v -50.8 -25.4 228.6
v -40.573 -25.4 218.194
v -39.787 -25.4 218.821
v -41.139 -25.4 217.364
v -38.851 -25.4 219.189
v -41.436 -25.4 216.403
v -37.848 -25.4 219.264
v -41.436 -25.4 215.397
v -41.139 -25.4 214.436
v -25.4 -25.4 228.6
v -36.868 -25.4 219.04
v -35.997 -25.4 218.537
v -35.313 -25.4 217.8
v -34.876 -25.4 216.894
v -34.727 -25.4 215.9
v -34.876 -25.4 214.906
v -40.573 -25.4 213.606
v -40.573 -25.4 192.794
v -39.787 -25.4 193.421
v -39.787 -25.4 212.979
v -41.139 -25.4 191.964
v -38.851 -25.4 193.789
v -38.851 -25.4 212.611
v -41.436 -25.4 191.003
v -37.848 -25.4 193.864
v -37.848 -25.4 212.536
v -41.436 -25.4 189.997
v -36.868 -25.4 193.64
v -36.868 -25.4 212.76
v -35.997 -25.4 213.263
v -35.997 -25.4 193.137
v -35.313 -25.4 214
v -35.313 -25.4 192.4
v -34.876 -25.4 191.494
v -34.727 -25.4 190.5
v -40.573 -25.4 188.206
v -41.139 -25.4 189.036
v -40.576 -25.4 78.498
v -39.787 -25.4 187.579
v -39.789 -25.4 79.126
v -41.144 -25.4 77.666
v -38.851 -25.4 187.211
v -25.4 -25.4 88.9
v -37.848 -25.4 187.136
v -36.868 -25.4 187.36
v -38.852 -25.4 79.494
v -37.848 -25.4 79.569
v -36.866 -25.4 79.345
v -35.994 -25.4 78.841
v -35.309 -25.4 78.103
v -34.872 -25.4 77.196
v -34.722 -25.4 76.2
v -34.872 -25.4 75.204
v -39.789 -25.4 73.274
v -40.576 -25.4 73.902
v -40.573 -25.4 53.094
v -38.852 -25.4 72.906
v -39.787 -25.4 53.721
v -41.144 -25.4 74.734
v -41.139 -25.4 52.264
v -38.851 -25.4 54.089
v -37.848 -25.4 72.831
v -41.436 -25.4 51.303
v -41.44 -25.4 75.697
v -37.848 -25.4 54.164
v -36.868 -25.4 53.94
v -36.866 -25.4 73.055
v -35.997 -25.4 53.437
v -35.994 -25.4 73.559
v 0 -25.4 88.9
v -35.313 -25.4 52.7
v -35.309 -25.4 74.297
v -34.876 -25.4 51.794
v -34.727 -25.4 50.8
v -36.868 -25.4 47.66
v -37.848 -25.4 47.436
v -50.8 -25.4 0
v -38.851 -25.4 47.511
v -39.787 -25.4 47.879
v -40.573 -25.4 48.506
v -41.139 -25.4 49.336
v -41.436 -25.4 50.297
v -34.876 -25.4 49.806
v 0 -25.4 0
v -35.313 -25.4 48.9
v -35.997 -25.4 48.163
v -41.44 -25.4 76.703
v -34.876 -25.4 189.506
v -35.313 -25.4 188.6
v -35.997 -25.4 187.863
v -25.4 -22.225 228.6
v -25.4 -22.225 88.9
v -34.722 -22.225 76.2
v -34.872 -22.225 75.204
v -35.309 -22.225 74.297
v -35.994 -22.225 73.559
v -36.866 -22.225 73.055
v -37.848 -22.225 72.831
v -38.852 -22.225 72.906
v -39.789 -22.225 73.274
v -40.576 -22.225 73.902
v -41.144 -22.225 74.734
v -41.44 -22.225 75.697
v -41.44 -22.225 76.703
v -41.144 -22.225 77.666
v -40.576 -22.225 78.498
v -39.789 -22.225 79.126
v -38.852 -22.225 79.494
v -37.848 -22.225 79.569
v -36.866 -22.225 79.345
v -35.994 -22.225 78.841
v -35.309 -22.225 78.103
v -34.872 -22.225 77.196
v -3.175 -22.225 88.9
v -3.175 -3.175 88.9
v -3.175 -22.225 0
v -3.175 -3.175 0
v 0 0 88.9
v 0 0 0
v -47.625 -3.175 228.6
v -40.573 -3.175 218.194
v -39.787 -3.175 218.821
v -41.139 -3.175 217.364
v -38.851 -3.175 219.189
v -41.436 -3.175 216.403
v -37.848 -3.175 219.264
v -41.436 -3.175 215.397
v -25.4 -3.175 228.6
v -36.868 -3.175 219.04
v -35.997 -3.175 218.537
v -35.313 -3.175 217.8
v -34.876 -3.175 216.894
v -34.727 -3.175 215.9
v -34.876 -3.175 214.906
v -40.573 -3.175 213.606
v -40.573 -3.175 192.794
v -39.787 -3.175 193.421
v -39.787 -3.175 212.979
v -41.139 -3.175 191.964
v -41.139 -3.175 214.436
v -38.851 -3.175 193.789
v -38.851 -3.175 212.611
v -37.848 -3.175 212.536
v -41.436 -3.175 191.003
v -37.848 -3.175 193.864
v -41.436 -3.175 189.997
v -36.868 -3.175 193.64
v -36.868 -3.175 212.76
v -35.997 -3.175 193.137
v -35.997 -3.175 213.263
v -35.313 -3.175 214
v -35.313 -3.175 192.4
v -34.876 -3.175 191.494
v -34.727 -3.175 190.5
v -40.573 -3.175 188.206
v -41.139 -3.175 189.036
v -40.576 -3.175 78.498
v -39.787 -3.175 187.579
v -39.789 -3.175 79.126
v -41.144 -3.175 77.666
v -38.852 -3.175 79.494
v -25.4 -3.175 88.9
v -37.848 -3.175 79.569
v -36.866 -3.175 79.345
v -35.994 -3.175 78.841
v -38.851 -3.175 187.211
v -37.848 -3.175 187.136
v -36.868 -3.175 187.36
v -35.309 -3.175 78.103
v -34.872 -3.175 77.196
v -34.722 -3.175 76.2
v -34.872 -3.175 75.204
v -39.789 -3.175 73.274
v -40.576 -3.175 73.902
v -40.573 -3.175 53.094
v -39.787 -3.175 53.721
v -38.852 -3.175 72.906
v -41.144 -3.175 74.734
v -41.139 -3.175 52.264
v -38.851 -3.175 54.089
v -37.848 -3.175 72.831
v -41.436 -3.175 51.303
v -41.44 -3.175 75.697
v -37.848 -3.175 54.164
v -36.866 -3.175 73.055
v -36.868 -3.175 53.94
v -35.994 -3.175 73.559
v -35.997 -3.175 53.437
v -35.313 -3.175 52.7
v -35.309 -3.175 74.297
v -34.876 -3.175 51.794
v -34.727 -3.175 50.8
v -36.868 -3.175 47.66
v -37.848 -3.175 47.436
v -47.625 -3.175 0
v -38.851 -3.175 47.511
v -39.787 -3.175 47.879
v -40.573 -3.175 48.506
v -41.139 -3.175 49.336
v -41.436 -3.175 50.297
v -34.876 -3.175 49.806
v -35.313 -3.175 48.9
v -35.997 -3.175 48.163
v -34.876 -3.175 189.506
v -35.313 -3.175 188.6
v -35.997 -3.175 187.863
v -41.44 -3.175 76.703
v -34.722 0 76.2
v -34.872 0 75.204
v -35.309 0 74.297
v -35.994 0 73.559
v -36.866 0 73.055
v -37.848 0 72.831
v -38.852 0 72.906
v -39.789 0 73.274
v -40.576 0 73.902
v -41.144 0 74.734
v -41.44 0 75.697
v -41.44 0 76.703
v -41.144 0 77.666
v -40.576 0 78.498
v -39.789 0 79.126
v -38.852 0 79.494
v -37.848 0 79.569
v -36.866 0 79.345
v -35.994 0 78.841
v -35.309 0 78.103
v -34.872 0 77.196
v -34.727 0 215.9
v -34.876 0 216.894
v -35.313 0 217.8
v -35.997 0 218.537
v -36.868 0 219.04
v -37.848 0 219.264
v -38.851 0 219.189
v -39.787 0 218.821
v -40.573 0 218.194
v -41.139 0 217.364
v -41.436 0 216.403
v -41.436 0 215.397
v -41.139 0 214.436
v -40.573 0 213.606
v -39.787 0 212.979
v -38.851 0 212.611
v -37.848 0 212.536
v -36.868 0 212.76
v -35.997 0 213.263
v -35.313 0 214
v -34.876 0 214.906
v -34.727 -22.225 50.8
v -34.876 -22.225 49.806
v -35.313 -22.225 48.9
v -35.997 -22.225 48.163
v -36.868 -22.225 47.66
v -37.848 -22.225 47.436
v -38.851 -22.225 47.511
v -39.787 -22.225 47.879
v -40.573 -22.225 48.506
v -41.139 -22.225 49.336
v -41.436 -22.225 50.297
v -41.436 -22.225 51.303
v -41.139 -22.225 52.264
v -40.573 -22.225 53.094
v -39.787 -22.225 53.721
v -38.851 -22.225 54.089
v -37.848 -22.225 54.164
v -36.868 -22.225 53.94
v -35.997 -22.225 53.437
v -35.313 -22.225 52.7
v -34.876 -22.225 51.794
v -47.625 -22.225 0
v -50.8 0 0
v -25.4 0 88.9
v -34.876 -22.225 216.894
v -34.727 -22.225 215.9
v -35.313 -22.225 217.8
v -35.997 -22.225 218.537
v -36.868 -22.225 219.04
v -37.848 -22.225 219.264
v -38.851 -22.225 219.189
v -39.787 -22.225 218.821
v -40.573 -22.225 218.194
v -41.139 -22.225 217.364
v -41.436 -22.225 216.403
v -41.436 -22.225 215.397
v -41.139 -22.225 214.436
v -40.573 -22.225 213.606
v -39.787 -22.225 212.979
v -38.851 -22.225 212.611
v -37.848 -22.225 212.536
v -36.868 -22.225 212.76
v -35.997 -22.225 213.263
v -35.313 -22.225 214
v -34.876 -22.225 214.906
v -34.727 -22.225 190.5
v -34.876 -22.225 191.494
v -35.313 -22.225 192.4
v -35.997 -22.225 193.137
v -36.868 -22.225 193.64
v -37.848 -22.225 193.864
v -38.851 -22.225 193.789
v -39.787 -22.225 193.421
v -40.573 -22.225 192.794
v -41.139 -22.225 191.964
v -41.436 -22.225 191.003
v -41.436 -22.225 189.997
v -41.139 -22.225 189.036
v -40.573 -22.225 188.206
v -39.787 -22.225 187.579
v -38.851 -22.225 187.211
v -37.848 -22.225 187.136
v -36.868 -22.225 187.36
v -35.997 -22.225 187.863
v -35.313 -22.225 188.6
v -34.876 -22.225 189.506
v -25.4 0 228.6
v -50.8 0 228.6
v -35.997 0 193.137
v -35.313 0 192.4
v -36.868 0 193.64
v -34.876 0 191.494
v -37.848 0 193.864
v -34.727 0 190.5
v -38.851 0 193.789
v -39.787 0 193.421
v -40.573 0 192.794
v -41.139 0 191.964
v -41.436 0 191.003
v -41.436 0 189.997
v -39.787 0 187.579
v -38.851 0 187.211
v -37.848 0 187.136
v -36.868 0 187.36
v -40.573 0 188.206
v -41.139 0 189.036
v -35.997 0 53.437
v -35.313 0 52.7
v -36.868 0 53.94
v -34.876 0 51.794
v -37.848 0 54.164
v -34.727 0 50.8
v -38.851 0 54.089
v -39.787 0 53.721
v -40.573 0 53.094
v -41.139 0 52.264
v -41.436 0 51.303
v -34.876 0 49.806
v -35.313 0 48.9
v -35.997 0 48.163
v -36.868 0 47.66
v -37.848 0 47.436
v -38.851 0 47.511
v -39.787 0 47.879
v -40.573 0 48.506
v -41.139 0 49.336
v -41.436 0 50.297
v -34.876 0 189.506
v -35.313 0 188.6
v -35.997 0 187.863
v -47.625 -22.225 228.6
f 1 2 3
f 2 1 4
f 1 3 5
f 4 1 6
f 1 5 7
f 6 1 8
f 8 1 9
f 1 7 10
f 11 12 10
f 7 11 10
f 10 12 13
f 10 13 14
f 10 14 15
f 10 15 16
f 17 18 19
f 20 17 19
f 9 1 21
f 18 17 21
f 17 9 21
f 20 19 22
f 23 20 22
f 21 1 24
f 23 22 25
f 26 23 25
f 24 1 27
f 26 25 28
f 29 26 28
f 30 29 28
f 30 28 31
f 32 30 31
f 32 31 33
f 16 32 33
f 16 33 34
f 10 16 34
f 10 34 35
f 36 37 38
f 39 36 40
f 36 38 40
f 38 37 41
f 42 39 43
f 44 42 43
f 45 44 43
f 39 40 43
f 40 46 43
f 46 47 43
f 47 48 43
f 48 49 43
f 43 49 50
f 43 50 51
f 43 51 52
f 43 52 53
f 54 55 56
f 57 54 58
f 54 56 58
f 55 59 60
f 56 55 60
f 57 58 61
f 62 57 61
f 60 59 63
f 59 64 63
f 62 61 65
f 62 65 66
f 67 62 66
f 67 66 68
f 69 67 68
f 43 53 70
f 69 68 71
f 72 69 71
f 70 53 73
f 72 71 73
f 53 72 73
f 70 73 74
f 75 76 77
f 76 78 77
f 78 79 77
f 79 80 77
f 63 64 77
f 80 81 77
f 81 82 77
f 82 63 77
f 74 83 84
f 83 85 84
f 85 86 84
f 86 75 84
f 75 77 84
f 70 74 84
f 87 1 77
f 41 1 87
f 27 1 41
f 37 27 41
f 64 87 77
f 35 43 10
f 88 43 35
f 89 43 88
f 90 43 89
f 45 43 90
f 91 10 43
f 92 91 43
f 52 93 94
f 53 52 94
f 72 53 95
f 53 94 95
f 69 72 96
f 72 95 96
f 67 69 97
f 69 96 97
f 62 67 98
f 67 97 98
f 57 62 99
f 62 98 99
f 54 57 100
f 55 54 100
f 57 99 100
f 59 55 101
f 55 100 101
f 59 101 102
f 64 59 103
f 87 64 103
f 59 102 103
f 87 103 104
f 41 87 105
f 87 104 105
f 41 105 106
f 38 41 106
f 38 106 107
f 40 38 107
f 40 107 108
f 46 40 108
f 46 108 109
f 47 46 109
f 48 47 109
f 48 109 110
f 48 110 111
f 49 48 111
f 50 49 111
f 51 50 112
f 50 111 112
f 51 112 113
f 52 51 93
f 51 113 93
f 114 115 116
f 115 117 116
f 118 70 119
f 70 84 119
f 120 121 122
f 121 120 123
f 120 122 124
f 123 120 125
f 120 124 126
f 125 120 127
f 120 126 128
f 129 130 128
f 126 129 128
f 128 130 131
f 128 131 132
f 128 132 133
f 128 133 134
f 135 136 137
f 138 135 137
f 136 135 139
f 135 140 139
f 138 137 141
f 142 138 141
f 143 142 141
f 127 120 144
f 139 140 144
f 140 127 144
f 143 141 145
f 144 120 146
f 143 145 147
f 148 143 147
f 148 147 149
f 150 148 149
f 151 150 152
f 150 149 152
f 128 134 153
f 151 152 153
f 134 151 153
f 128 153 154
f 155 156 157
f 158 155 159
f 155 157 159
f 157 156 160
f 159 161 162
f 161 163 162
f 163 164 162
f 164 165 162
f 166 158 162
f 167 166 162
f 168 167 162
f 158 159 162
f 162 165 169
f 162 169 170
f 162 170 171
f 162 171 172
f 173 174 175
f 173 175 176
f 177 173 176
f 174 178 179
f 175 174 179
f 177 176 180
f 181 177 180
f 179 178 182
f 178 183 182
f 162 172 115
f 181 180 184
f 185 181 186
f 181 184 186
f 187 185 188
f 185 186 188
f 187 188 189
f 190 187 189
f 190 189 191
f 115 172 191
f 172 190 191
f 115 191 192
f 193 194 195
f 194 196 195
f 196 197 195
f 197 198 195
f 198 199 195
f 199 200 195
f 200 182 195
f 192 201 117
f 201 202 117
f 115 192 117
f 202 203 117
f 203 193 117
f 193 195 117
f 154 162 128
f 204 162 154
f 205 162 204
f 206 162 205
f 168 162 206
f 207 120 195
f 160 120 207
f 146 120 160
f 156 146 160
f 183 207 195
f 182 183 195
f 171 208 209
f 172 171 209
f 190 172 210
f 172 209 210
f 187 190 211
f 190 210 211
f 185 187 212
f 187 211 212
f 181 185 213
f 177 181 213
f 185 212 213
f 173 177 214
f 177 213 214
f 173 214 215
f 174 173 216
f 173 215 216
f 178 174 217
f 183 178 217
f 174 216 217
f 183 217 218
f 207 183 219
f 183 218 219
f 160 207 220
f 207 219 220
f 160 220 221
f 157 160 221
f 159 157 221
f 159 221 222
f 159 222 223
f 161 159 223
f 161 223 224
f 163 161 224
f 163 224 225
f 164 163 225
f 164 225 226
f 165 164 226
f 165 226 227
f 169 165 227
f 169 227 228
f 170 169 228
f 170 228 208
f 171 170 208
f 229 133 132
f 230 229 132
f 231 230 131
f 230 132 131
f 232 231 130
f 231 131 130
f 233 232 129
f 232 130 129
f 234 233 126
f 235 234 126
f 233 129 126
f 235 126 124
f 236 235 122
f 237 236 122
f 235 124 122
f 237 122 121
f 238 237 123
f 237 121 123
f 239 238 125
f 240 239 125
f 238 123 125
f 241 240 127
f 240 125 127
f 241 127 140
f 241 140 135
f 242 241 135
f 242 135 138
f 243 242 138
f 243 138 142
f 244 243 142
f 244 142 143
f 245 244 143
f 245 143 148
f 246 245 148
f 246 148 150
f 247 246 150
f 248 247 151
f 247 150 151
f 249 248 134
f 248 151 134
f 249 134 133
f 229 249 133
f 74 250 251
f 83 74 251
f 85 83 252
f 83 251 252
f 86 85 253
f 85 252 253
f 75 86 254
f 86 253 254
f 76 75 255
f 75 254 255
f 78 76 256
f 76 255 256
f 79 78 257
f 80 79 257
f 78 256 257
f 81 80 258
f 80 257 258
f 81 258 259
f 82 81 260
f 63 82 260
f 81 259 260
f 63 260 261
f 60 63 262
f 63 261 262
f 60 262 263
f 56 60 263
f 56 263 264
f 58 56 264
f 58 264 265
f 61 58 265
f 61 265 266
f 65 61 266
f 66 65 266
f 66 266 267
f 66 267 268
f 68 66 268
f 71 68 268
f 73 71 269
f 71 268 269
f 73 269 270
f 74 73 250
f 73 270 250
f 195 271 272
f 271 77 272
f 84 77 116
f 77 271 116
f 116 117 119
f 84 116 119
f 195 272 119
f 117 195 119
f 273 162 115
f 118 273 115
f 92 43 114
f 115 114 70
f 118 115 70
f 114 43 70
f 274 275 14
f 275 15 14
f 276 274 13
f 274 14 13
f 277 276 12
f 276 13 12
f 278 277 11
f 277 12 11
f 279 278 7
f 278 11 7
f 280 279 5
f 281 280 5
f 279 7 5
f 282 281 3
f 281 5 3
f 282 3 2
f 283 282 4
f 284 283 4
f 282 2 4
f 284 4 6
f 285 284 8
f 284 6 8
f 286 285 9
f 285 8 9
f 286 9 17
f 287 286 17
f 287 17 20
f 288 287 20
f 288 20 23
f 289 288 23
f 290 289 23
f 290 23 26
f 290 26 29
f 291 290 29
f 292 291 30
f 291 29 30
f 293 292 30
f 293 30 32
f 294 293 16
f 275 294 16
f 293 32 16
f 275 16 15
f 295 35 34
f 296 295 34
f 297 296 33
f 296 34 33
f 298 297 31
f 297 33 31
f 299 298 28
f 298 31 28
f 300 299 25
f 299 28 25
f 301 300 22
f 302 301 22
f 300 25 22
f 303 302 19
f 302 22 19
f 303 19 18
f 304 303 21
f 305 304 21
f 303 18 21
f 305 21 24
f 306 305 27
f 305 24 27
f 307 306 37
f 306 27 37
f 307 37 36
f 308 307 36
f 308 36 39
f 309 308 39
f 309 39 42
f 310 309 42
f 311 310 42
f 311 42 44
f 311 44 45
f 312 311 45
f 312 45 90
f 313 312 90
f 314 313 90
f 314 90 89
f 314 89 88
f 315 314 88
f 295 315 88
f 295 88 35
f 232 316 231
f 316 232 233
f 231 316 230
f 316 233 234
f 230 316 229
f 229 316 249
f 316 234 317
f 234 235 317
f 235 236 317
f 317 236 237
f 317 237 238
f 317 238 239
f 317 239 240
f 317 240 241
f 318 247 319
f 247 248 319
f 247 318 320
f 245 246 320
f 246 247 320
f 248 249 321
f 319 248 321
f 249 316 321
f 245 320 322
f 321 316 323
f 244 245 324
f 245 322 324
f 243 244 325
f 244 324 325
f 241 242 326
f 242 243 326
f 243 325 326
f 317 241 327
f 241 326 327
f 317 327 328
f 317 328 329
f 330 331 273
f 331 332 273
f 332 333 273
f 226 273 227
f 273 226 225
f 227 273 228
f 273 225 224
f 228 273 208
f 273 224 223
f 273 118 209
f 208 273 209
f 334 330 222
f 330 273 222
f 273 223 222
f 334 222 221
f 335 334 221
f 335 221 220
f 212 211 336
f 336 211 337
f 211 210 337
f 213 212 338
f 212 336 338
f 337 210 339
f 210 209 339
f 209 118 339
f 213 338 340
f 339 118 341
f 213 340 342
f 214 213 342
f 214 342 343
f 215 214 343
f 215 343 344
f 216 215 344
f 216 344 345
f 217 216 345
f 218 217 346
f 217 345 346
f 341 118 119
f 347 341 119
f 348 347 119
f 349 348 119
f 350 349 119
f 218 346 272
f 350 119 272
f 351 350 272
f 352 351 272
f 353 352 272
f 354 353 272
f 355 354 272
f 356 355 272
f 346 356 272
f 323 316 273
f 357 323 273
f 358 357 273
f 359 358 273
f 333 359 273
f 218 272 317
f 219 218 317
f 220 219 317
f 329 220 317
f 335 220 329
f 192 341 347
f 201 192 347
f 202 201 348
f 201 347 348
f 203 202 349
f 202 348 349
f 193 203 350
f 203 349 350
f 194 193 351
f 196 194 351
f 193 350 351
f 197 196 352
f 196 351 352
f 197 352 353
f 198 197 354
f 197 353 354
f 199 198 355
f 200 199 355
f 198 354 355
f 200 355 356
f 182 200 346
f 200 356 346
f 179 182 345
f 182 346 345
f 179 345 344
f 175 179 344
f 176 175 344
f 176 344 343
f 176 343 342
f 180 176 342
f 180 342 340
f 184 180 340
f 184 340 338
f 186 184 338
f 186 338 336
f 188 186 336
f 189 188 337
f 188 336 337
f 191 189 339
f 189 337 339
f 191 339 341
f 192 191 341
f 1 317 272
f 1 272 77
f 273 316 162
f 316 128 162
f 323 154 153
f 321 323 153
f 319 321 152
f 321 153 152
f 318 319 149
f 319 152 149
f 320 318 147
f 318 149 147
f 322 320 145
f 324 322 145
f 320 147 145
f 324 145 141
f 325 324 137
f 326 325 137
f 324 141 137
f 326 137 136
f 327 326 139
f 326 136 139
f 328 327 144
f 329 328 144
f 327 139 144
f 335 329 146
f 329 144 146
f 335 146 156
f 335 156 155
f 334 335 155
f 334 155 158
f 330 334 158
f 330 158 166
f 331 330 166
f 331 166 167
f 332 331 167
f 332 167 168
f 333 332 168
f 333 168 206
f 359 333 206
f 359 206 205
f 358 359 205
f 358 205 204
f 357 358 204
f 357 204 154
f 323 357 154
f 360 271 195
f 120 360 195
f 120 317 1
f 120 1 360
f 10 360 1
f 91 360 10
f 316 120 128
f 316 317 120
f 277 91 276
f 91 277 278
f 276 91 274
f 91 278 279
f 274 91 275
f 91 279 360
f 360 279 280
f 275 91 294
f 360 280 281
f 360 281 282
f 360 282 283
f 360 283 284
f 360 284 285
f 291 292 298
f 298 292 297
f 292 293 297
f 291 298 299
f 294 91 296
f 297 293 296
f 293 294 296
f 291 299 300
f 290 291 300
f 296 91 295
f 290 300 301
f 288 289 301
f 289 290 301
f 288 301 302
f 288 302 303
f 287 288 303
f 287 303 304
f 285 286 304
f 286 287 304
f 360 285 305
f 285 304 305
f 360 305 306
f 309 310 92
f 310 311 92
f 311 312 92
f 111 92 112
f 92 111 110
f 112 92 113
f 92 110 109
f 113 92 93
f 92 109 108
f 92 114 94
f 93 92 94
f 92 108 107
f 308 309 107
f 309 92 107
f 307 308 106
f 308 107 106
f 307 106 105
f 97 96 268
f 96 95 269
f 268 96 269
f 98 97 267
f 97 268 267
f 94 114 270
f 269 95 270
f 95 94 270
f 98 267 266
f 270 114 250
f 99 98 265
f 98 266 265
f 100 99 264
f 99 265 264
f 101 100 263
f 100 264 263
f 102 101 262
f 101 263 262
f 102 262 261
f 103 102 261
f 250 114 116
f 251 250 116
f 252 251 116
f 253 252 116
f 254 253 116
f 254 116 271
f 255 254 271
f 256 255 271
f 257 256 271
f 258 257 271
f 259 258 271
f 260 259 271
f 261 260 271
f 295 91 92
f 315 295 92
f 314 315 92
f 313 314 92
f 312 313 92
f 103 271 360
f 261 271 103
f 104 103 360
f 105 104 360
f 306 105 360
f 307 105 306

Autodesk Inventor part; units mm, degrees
ref_plane "YZ Plane" through (0, 0, 0) normal (1, 0, 0) x (0, 1, 0)
ref_plane "XZ Plane" through (0, 0, 0) normal (0, 1, 0) x (-1, 0, 0)
ref_plane "XY Plane" through (0, 0, 0) normal (0, 0, 1) x (1, 0, 0)
sketch "Sketch1" plane through (0, 0, 0) normal (0, 0, 1) x (1, 0, 0)
  line L0 (0, 0) -> (-50.8, 0)
  line L1 (-50.8, 0) -> (-50.8, -25.4)
  line L2 (-50.8, -25.4) -> (0, -25.4)
  line L3 (0, -25.4) -> (0, 0)
  line L4 (-3.175, -22.225) -> (-47.625, -22.225)
  line L5 (-47.625, -22.225) -> (-47.625, -3.175)
  line L6 (-47.625, -3.175) -> (-3.175, -3.175)
  line L7 (-3.175, -3.175) -> (-3.175, -22.225)
  dimension "d0" = 50.8
  dimension "d1" = 25.4
  dimension "d2" = 3.175
extrude "Extrusion1" add sketch "Sketch1" along normal blind 228.6
sketch "Sketch2" plane through (-50.8, -25.4, 0) normal (0, -1, 0) x (1, 0, 0)
  line L0 (0, 228.6) -> (50.8, 228.6) projected
  line L1 (50.8, 228.6) -> (25.4, 228.6)
  line L2 (25.4, 228.6) -> (25.4, 88.9)
  line L3 (25.4, 88.9) -> (50.8, 88.9)
  line L4 (50.8, 88.9) -> (50.8, 228.6)
  point P0 (50.8, 0)
  dimension "d5" = 25.4
  dimension "d6" = 139.7
extrude "Extrusion2" cut sketch "Sketch2" against normal blind 25.4
sketch "Sketch3" plane through (-50.8, -25.4, 0) normal (0, -1, 0) x (1, 0, 0)
  circle A0 centre (12.7, 215.9) radius 3.3734
  circle A1 centre (12.7, 190.5) radius 3.3734
  line L0 (25.4, 88.9) -> (25.4, 228.6) projected
  line L1 (0, 228.6) -> (25.4, 228.6) projected
  point P0 (50.8, 0)
  dimension "d9" = 6.7469
  dimension "d10" = 6.7469
  dimension "d11" = 12.7
  dimension "d12" = 12.7
  dimension "d13" = 12.7
  dimension "d14" = 38.1
extrude "Extrusion3" cut sketch "Sketch3" against normal blind 25.4
sketch "Sketch4" plane through (-50.8, 0, 0) normal (0, 1, 0) x (1, 0, 0)
  circle A0 centre (12.7, -50.8) radius 3.3734
  circle A1 centre (12.7, -76.2) radius 3.3782
  line L0 (50.8, 0) -> (0, 0) projected
  line L1 (0, 0) -> (0, -228.6) projected
  dimension "d17" = 6.7469
  dimension "d18" = 6.7564
  dimension "d19" = 50.8
  dimension "d20" = 12.7
  dimension "d21" = 12.7
  dimension "d22" = 25.4
extrude "Extrusion4" cut sketch "Sketch4" against normal blind 25.4
properties part number "vertical support" material "Aluminum 6061"
